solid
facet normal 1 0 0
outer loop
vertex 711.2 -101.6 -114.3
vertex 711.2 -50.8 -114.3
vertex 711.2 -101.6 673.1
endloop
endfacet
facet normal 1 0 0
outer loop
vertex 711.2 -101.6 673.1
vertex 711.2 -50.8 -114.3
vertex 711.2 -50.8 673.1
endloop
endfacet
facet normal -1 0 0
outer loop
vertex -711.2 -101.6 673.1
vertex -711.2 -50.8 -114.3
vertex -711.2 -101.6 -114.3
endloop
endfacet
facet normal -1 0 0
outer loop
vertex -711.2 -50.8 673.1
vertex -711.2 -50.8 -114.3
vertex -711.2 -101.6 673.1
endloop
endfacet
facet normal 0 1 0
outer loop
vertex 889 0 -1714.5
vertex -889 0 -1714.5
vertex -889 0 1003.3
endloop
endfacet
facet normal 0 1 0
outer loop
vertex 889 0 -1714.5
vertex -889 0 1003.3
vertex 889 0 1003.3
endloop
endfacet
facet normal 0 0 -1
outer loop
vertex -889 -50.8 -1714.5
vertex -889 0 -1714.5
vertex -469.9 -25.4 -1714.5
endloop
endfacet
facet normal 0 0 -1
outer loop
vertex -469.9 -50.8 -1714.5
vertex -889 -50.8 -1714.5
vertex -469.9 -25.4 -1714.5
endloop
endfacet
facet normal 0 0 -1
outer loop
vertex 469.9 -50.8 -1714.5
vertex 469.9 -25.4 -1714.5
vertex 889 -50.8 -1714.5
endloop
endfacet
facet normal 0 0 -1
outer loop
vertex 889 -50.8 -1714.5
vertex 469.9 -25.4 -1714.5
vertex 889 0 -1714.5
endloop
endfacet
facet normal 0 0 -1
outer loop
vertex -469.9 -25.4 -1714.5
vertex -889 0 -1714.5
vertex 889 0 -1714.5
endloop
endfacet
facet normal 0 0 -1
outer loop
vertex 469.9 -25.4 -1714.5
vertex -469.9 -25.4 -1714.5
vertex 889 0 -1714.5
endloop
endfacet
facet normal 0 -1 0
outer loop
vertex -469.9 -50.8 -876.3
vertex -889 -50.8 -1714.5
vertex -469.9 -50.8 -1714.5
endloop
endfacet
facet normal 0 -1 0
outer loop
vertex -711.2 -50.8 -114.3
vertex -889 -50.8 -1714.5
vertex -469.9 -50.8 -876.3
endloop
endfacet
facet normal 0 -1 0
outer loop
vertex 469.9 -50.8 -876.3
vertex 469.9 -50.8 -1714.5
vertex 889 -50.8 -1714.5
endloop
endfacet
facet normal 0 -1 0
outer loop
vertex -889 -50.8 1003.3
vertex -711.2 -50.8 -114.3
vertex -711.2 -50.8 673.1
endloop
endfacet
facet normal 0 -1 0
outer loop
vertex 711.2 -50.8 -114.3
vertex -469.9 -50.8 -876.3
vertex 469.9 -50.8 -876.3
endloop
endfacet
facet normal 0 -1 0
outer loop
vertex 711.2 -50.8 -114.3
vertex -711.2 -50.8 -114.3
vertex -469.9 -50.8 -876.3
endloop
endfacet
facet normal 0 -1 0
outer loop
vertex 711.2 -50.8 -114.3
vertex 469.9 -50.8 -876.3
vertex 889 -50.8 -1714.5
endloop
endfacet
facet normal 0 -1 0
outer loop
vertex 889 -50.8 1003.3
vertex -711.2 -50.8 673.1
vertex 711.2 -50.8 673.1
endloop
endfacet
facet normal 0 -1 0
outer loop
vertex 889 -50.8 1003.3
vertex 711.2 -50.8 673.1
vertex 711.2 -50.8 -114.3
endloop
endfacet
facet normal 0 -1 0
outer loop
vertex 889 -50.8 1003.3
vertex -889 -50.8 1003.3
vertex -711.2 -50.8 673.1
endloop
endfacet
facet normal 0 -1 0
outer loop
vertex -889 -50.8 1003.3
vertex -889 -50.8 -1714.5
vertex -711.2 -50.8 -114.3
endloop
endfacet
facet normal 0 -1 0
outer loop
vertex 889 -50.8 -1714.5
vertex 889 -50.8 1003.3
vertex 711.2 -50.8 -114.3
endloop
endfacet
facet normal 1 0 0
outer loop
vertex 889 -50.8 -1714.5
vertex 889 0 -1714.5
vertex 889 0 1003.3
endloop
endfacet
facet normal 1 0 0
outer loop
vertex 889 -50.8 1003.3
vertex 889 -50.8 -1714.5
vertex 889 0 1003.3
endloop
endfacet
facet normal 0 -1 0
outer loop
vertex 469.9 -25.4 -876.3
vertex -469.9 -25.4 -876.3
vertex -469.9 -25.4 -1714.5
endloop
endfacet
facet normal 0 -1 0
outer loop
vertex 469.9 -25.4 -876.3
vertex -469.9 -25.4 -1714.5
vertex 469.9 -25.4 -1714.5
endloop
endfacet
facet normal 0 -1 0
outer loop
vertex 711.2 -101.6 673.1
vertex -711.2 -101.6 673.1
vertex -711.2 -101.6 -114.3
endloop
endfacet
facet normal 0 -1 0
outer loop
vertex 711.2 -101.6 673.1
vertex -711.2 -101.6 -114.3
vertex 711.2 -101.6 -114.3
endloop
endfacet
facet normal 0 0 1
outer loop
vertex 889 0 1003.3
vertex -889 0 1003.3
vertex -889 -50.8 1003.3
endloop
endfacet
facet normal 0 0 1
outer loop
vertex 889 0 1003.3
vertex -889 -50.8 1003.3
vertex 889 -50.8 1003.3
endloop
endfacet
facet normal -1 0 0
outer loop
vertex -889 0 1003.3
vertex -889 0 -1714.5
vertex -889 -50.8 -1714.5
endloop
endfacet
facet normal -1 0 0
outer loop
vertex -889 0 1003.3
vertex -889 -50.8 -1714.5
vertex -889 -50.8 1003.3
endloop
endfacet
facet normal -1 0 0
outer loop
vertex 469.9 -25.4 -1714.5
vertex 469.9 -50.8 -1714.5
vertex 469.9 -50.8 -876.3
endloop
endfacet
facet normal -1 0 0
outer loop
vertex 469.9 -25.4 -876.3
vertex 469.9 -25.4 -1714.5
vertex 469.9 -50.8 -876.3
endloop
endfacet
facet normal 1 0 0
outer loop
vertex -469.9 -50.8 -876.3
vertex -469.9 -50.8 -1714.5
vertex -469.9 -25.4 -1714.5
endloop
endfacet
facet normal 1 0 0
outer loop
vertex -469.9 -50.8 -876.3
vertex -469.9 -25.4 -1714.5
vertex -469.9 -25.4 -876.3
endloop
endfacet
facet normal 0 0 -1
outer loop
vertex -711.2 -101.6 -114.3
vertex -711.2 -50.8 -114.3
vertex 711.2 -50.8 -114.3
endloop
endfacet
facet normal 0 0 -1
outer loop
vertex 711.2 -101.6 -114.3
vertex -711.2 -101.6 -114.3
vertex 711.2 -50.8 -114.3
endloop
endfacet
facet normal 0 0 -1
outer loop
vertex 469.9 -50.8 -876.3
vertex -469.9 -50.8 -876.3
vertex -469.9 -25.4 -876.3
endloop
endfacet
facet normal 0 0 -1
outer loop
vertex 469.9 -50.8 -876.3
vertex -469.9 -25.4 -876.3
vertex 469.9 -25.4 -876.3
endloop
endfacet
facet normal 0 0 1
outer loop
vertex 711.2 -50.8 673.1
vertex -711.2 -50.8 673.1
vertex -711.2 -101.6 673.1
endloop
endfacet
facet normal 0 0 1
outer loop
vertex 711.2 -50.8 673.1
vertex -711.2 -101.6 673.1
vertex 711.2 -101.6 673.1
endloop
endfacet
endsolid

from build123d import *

# Parameters (mm, degrees)
F0_W     = 1778
F0_H     = 2717.8
F1_DEPTH = 50.8
F2_W     = 939.8
F2_H     = 838.2
F3_DEPTH = 25.4
F4_W     = 1422.4
F4_H     = 787.4
F5_DEPTH = 50.8


with BuildPart() as f1:
    # F0 (on Front) → F1 (new body)
    with BuildSketch(Plane.XZ):
        with Locations((0, -355.6)):
            Rectangle(F0_W, F0_H)
    extrude(amount=F1_DEPTH)

    # F2 (on face) → F3 (cut)
    with BuildSketch(Plane.XZ.offset(50.8)):
        with Locations((0, -1295.4)):
            Rectangle(F2_W, F2_H)
    extrude(amount=-F3_DEPTH, mode=Mode.SUBTRACT)

    # F4 (on face) → F5 (join)
    with BuildSketch(Plane.XZ.offset(50.8)):
        with Locations((0, 279.4)):
            Rectangle(F4_W, F4_H)
    extrude(amount=F5_DEPTH)


solid = f1.part
